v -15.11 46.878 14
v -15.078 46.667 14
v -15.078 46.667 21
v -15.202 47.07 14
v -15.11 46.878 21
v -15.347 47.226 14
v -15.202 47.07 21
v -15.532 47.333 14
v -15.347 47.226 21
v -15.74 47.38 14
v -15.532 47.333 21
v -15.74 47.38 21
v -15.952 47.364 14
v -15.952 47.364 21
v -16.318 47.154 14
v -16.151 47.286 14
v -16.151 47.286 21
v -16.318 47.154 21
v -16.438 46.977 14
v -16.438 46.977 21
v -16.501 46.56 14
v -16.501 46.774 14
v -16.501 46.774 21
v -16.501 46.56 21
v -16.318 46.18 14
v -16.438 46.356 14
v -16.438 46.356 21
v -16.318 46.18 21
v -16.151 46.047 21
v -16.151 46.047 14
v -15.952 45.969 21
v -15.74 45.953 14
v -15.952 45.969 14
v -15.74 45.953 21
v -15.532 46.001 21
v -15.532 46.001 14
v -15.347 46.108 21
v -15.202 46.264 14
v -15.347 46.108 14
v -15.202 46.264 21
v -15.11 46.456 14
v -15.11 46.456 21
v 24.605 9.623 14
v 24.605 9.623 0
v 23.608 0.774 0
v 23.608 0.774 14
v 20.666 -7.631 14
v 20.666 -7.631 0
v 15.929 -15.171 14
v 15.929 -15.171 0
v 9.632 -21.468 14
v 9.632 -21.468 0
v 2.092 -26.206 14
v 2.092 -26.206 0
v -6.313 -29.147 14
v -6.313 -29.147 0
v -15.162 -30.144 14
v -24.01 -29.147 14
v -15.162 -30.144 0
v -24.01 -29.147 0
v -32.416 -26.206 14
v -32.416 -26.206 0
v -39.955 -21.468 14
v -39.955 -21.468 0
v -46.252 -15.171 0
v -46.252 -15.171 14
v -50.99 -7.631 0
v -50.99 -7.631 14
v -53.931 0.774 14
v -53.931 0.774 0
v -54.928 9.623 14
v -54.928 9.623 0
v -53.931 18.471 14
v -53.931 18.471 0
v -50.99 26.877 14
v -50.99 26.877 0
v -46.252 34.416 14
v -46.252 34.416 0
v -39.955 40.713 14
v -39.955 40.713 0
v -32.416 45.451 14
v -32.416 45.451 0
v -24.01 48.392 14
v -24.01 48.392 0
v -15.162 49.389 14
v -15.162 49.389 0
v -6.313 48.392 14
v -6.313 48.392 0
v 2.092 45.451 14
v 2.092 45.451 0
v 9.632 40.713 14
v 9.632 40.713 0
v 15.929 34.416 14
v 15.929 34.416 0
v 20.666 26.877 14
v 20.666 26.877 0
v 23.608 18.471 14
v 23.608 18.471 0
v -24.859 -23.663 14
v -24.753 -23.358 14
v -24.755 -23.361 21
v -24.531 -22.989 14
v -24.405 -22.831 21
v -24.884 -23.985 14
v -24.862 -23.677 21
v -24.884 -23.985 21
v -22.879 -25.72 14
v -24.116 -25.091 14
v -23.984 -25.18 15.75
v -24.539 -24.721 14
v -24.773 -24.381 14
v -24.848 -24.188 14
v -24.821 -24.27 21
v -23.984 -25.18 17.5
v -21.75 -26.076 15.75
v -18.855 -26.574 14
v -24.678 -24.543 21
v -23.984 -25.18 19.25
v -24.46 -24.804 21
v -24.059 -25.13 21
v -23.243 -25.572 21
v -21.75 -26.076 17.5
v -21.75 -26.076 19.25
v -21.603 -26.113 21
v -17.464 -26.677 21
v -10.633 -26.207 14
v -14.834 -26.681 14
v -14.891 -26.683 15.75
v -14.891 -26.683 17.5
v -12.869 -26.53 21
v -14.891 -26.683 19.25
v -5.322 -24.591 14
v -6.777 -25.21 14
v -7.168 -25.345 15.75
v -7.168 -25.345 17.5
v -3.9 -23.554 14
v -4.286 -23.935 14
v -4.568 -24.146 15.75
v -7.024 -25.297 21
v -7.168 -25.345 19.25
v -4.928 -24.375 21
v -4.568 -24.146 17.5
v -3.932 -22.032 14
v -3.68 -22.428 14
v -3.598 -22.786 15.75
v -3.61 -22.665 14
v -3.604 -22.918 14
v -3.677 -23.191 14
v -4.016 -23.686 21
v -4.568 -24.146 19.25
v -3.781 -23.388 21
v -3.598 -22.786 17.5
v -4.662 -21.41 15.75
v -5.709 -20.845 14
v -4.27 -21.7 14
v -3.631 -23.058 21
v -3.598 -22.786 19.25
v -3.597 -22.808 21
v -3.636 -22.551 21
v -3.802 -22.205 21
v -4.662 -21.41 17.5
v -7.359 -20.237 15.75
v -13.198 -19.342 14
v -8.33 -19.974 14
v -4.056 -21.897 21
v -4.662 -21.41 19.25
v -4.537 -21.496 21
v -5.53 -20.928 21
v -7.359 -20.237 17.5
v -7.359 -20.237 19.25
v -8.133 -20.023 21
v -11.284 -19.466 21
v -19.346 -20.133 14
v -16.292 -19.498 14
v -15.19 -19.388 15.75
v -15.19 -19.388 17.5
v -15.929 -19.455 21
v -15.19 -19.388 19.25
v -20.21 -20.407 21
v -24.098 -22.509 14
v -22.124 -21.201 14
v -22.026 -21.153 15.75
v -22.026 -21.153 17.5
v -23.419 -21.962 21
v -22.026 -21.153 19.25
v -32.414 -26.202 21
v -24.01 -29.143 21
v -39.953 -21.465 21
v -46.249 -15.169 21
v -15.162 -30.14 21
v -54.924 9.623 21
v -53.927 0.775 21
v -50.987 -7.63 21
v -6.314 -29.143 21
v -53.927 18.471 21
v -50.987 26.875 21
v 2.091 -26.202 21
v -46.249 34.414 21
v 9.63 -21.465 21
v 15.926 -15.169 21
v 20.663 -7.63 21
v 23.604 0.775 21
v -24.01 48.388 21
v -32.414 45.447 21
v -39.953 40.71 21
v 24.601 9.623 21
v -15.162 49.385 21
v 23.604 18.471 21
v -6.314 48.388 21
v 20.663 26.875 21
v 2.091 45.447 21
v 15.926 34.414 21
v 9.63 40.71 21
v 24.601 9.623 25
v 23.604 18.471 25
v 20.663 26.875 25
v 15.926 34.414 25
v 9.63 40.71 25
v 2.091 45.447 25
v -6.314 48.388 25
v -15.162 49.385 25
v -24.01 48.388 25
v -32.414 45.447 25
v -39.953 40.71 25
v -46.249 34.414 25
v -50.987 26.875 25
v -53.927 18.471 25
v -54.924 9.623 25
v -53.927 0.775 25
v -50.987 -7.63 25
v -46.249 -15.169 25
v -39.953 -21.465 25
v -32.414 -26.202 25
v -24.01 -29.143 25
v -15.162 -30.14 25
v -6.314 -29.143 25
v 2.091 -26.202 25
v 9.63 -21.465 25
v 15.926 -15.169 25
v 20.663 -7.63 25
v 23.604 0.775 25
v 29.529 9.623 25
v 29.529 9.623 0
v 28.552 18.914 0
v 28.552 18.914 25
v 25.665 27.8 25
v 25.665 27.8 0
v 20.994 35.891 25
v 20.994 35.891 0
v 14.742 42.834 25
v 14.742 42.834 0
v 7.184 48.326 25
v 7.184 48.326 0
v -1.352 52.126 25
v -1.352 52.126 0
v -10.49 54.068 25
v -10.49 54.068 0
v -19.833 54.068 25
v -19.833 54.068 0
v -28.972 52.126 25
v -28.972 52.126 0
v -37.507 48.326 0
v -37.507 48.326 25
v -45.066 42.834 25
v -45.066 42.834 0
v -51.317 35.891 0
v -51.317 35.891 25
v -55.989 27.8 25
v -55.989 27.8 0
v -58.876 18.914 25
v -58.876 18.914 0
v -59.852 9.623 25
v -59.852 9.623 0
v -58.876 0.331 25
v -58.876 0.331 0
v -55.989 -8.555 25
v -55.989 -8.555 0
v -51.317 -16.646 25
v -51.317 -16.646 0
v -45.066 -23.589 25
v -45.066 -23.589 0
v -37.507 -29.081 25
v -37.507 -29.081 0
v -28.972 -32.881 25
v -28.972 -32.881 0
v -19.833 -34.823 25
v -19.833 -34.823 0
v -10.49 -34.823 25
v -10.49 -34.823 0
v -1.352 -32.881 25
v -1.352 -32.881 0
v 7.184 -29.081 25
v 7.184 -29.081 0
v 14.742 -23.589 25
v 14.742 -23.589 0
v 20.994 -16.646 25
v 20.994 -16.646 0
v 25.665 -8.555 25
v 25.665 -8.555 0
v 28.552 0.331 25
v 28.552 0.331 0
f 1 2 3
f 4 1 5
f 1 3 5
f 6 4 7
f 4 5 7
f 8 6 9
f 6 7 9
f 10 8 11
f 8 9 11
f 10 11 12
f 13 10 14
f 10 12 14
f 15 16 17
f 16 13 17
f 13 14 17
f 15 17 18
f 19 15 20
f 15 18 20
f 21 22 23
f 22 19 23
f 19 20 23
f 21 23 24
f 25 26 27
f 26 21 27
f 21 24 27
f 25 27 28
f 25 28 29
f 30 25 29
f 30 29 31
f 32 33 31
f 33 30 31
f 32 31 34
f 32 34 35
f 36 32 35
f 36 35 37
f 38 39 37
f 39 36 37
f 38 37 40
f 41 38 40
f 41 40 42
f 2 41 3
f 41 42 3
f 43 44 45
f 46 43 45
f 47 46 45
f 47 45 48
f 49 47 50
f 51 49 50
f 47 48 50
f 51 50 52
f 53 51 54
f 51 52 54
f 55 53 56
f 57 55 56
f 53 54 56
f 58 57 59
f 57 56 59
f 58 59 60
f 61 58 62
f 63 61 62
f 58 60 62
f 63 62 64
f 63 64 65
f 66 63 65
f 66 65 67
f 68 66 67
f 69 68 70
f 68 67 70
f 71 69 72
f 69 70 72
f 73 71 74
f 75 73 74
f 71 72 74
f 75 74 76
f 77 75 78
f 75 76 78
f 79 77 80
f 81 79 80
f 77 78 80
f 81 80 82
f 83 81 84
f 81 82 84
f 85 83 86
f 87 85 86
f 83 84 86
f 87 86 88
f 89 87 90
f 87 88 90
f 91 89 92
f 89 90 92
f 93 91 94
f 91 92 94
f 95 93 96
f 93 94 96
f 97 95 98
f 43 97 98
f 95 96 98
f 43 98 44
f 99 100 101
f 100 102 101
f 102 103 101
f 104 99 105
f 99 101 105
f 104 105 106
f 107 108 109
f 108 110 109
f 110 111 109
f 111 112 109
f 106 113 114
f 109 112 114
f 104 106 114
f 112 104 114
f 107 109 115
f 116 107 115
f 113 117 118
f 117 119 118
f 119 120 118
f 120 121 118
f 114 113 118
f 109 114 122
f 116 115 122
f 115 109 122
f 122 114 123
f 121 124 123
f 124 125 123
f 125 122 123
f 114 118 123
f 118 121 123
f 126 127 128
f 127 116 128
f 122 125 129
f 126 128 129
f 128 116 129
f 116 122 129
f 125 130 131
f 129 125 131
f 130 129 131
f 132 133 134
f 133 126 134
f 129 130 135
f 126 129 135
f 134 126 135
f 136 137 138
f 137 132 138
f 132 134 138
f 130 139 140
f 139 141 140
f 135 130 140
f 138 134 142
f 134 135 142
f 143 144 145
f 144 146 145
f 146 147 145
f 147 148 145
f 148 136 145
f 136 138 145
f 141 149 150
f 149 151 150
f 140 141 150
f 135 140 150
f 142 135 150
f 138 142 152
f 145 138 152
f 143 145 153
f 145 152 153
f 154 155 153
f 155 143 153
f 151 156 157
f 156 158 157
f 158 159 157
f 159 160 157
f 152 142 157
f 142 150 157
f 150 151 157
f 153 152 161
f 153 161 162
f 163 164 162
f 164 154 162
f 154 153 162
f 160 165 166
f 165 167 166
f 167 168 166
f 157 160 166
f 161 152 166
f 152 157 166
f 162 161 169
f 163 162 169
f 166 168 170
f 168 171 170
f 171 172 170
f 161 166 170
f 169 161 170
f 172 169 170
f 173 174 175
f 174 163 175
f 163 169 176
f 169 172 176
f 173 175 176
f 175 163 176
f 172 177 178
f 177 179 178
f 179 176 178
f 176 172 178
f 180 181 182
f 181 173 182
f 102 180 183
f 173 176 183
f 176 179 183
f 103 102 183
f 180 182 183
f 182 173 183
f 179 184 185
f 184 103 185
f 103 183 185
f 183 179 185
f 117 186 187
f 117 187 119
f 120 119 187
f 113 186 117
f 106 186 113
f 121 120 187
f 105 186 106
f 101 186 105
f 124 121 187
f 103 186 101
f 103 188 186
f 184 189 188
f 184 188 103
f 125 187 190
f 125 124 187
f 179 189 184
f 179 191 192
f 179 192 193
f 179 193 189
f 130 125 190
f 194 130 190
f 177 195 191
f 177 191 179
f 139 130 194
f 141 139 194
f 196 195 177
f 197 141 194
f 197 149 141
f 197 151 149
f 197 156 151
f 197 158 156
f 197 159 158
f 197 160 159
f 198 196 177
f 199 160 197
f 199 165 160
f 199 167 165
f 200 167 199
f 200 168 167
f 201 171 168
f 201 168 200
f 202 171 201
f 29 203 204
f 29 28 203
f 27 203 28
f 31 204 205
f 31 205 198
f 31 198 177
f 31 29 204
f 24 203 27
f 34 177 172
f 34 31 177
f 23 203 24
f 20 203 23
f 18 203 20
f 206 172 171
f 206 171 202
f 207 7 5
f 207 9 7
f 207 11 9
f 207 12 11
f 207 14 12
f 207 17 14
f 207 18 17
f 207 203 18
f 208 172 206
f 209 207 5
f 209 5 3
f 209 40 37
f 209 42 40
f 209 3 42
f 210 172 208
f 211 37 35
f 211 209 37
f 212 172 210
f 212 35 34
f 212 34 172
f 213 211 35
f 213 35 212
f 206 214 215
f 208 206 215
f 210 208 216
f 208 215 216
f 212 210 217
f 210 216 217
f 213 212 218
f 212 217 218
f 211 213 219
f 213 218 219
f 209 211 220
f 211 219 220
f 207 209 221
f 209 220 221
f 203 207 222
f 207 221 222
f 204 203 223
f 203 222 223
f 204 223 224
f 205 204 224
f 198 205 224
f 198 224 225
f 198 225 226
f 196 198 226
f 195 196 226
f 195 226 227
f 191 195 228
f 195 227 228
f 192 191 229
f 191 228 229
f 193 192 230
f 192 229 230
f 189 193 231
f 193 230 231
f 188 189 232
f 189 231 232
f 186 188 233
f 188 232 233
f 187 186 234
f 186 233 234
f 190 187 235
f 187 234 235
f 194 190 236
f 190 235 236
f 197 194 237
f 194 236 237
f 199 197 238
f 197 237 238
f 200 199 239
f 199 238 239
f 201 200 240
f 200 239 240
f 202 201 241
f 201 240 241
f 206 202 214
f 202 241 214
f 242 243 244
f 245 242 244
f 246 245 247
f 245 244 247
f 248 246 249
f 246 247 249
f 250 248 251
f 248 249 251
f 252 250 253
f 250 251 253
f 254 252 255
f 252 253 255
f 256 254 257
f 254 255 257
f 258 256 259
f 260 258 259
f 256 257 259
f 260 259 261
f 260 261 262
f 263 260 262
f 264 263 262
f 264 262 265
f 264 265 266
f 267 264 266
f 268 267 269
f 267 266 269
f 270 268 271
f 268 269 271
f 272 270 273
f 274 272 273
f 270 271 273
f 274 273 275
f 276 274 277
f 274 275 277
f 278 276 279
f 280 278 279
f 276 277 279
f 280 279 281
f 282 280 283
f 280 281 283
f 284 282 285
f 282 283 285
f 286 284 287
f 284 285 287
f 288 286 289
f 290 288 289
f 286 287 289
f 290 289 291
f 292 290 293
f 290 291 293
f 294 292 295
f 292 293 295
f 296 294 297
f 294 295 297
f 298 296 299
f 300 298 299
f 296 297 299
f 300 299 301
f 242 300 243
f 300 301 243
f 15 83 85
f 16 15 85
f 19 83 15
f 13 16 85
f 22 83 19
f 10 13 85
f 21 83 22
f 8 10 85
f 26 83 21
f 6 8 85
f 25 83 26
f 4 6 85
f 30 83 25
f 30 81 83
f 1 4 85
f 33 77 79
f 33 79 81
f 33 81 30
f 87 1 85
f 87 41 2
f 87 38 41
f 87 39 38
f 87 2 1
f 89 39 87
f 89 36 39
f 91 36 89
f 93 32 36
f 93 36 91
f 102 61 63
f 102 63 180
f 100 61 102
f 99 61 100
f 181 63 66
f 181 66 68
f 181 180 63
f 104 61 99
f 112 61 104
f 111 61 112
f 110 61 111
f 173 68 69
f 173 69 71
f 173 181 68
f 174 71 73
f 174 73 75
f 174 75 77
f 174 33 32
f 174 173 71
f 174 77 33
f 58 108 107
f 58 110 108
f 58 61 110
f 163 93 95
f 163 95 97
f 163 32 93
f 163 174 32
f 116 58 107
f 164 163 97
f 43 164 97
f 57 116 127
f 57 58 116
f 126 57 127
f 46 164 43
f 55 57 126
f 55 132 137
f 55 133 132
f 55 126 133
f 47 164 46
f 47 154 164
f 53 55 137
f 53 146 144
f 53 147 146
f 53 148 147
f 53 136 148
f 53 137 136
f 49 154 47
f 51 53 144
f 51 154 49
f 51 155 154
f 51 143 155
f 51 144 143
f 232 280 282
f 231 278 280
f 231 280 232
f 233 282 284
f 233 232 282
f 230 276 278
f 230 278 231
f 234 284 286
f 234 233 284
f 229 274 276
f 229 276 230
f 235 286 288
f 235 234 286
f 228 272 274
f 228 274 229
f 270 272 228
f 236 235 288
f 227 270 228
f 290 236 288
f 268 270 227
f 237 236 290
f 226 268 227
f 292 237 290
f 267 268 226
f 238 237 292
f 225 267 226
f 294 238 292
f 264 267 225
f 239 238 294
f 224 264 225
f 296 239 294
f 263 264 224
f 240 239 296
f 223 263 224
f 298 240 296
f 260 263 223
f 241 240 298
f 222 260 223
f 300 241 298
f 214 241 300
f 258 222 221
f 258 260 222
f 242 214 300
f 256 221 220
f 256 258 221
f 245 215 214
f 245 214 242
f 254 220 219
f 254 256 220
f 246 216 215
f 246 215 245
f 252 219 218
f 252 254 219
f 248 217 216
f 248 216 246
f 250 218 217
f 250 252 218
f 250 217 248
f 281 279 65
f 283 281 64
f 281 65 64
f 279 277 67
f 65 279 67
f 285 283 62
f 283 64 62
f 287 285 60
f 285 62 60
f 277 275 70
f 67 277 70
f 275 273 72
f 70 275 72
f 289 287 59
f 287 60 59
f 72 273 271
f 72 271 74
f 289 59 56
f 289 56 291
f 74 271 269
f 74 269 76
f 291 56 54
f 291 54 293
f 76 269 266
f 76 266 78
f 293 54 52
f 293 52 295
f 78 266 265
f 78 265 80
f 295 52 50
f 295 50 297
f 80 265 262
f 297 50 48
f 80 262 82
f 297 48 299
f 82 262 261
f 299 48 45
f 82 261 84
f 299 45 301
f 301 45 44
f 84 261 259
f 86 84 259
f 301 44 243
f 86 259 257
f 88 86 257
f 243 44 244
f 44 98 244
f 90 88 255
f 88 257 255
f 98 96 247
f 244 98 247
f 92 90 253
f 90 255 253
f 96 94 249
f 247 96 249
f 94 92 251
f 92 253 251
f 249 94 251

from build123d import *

# Parameters (mm, degrees)
F0_R     = 44.6905983142
F1_DEPTH = 25
F2_R     = 39.7625811832
F3_DEPTH = 4
F5_DEPTH = 21.001
F6_R     = 0.7154375695
F7_DEPTH = 21.0010001
F8_R     = 39.7662150712
F8_R_2   = 0.7154375695
F9_DEPTH = 14


with BuildPart() as f1:
    # F0 (on Top) → F1 (new body)
    with BuildSketch(Plane.XY):
        with Locations((-15.1616595685, 9.6226148307)):
            Circle(F0_R)
    extrude(amount=F1_DEPTH)

    # F2 (on face) → F3 (cut)
    with BuildSketch(Plane.XY.offset(25)):
        with Locations((-15.1616595685, 9.6226148307)):
            Circle(F2_R)
    extrude(amount=-F3_DEPTH, mode=Mode.SUBTRACT)

    # F4 (on face) → F5 (cut, through all)
    with BuildSketch(Plane.XY.offset(21)):
        with BuildLine():
            add(Edge.make_bspline(
                [(-24.8842015862, -23.9847730845), (-24.751571743, -25.7479147281), (-14.8764070104, -28.1339639947), (2.363229172, -22.8278430113), (-15.4108273297, -17.1809770311), (-25.0192258083, -22.1898012822), (-24.8842015862, -23.9847730845)],
                knots=[0, 0, 0, 0, 0.2396576866, 0.4971175886, 0.7560157511, 1, 1, 1, 1], degree=3))
        make_face()
    extrude(amount=-F5_DEPTH, mode=Mode.SUBTRACT)

    # F6 (on face) → F7 (cut, through all)
    with BuildSketch(Plane.XY.offset(21)):
        with Locations((-15.7932732254, 46.6668978333)):
            Circle(F6_R)
    extrude(amount=-F7_DEPTH, mode=Mode.SUBTRACT)

    # F8 (on face) → F9 (cut)
    with BuildSketch(Plane(origin=(0, 0, 0), x_dir=(1, 0, 0), z_dir=(0, 0, -1))):
        with Locations((-15.1616595685, -9.6226148307)):
            Circle(F8_R)
        with Locations((-15.7932732254, -46.6668978333)):
            Circle(F8_R_2, mode=Mode.SUBTRACT)
        with BuildLine():
            add(Edge.make_bspline(
                [(-24.8842015862, 23.9847730845), (-24.8911452084, 23.8924666388), (-24.888371728, 23.799570827), (-24.8762555423, 23.7072804576), (-24.855790455, 23.6164271336), (-24.8281284381, 23.5275727498), (-24.7943692309, 23.4410534624), (-24.7554721282, 23.3569978115), (-24.6762660636, 23.2076683313), (-24.6373321353, 23.141629018), (-24.5957616183, 23.0771739055), (-24.5518941434, 23.0142517205), (-24.5060146802, 22.9528055987), (-24.4583585563, 22.8927697396), (-24.4091136917, 22.8340678621), (-24.2951335725, 22.7048867825), (-24.2296199391, 22.6351387447), (-24.1621765597, 22.5672221501), (-24.0930442899, 22.5010185723), (-24.0224196237, 22.4364260325), (-23.9504628247, 22.3733507123), (-23.8773019966, 22.3117027052), (-23.6280353269, 22.1092963253), (-23.4470131486, 21.9747437686), (-23.2612685118, 21.8466153281), (-23.0716712534, 21.7242481532), (-22.87886828, 21.6071333648), (-22.6833359387, 21.4948360767), (-22.4853761009, 21.3869997408), (-22.0365992692, 21.1545493655), (-21.7847229546, 21.0322559578), (-21.5300131244, 20.9158571469), (-21.2728395726, 20.8049762518), (-21.0134959265, 20.6993265457), (-20.7522141353, 20.5986781439), (-20.4891682368, 20.502849378), (-19.8972368304, 20.2989876643), (-19.5675375394, 20.1934415753), (-19.2356580968, 20.0947838468), (-18.9018320844, 20.0028445839), (-18.5662614795, 19.9175220072), (-18.2291224443, 19.838762292), (-17.8905679312, 19.7665502585), (-17.2582009761, 19.6444102678), (-16.964736384, 19.5927818802), (-16.6704234935, 19.5460424355), (-16.3753531794, 19.5042292364), (-16.0796172889, 19.4673986596), (-15.7833089045, 19.4356246154), (-15.4865226065, 19.4089970085), (-14.6964867848, 19.3521656766), (-14.2026325717, 19.3311579491), (-13.7082719853, 19.323673936), (-13.2138389543, 19.3290136415), (-12.7197212313, 19.3466491477), (-12.2262608224, 19.3762031344), (-11.7337550637, 19.4174569261), (-10.813518073, 19.5166010712), (-10.3855908509, 19.5717051597), (-9.9588285875, 19.6356829877), (-9.5334400248, 19.7086182547), (-9.109697804, 19.7907216797), (-8.6879395492, 19.8823360076), (-8.2685809043, 19.9840006907), (-7.6692511074, 20.1461394501), (-7.4869229926, 20.197739325), (-7.305219405, 20.2515355676), (-7.1241991626, 20.3076214003), (-6.9439349033, 20.3661052757), (-6.7645147562, 20.4271160266), (-6.5860453938, 20.4908121068), (-6.254696052, 20.6151838585), (-6.1015679798, 20.6751409609), (-5.9493429971, 20.7374007127), (-5.7981254711, 20.8021210424), (-5.6480527105, 20.8694825334), (-5.4993000619, 20.9396997859), (-5.352091776, 21.0130449311), (-5.049328083, 21.1730724882), (-4.8944301935, 21.2601773381), (-4.7420379458, 21.351804078), (-4.5925696804, 21.4486212058), (-4.4467809482, 21.5512951436), (-4.3059967032, 21.6607552403), (-4.171918878, 21.7779694123), (-3.9820103602, 21.9721649834), (-3.91933381, 22.0417830638), (-3.859860511, 22.1143746793), (-3.8042449113, 22.190231403), (-3.7534261664, 22.2695356098), (-3.7086220132, 22.352355558), (-3.6712765509, 22.4386130462), (-3.6325609686, 22.5604796694), (-3.6235475081, 22.592989586), (-3.6158562116, 22.625508139), (-3.6094987647, 22.6580310997), (-3.6044868395, 22.690554248), (-3.6008320948, 22.7230733726), (-3.5985461757, 22.7555842705), (-3.5967352526, 22.8205812138), (-3.5972089492, 22.8530673208), (-3.5990503765, 22.8855383141), (-3.6022481072, 22.9179914392), (-3.6067907142, 22.9504239415), (-3.6126667703, 22.9828330664), (-3.619864848, 23.0152160594), (-3.6428351371, 23.102560259), (-3.6608525682, 23.1565906194), (-3.6821125308, 23.2094824212), (-3.7062697452, 23.2611273323), (-3.7329838201, 23.3114710781), (-3.7619452523, 23.3605016698), (-3.7928905413, 23.408242296), (-3.8646571625, 23.5102606567), (-3.9062117551, 23.5639870404), (-3.949907681, 23.6160285277), (-3.995440574, 23.6664779113), (-4.0425578215, 23.7154257906), (-4.0910543201, 23.7629642703), (-4.140770382, 23.8091888469), (-4.2558032479, 23.9110669108), (-4.3217455541, 23.9659664387), (-4.3891611489, 24.0190785563), (-4.4578435397, 24.070548321), (-4.5276265311, 24.120498277), (-4.5983770003, 24.1690378707), (-4.6699912206, 24.2162683608), (-4.8598647658, 24.3369393694), (-4.979368245, 24.4083687716), (-5.1005551521, 24.4769559223), (-5.2231590563, 24.5429853098), (-5.3469747233, 24.606681357), (-5.4718435874, 24.6682345898), (-5.5976470884, 24.7278140349), (-5.8731020203, 24.8534095069), (-6.0230481389, 24.9187177349), (-6.1739919373, 24.9817193826), (-6.3258095179, 25.0425942529), (-6.4784007471, 25.1014892666), (-6.6316847131, 25.1585296043), (-6.7855972746, 25.2138248228), (-7.2450409477, 25.3733585476), (-7.5522097036, 25.4728034138), (-7.8612095316, 25.5665353033), (-8.1717534402, 25.6550457013), (-8.4836197787, 25.7387057177), (-8.7966397248, 25.8178093289), (-9.1106941619, 25.8925843063), (-9.7751521214, 26.0415643167), (-10.1257377207, 26.1148049283), (-10.4773290394, 26.1831793836), (-10.8298122723, 26.2468536908), (-11.1830903824, 26.3059373134), (-11.5370805939, 26.3604964973), (-11.8917133021, 26.410560103), (-12.4141126322, 26.4775592691), (-12.5814208468, 26.4980023592), (-12.7488502783, 26.517446117), (-12.916394228, 26.535887619), (-13.0840460673, 26.5533221125), (-13.2517992377, 26.569743015), (-13.4196472511, 26.5851419147), (-13.755440419, 26.6138684058), (-13.9233852036, 26.6271967172), (-14.0914117258, 26.6394844457), (-14.2595133059, 26.6507169279), (-14.4276829989, 26.6608821201), (-14.5959136343, 26.6699648285), (-14.7641978026, 26.6779426226), (-15.4668094045, 26.7065616899), (-16.0014815913, 26.717052595), (-16.5363439033, 26.7163761275), (-17.0711513874, 26.7044794526), (-17.6056107666, 26.6811276526), (-18.1393801372, 26.6459021949), (-18.6720648144, 26.5981210663), (-19.4381711152, 26.509353217), (-19.6728205121, 26.4794361441), (-19.9071102034, 26.4467241944), (-20.1409861033, 26.4110930398), (-20.374379842, 26.3723961579), (-20.607207594, 26.3304577799), (-20.8393678801, 26.2850600584), (-21.2714530924, 26.1932991389), (-21.4715479801, 26.1478661938), (-21.6709615908, 26.0994400371), (-21.8695961986, 26.0478050892), (-22.067313537, 25.9927020038), (-22.2639323316, 25.9338188721), (-22.4592205165, 25.8707637255), (-22.8526079279, 25.7330984996), (-23.0501942229, 25.658329585), (-23.2457129866, 25.5779976939), (-23.4388079377, 25.4912718478), (-23.6287503173, 25.3972628999), (-23.8142215655, 25.2946773515), (-23.993488719, 25.1821020816), (-24.2354137555, 25.0033783334), (-24.305527566, 24.9480349583), (-24.3736940108, 24.890201273), (-24.4395833556, 24.8296527893), (-24.5027360604, 24.7661764981), (-24.5625646396, 24.6995727976), (-24.6183569307, 24.6296586324), (-24.7132853809, 24.4928564182), (-24.7536853284, 24.4268044353), (-24.7898357294, 24.358145571), (-24.8210372692, 24.2870046025), (-24.8465837183, 24.2136183714), (-24.8658479214, 24.138366296), (-24.8784062595, 24.0618144324), (-24.8842015862, 23.9847730845)],
                knots=[0, 0, 0, 0, 0, 0, 0, 0, 0, 0.0154781502, 0.0154781502, 0.0154781502, 0.0154781502, 0.0154781502, 0.0154781502, 0.0154781502, 0.0283061693, 0.0283061693, 0.0283061693, 0.0283061693, 0.0283061693, 0.0283061693, 0.0283061693, 0.0443208042, 0.0443208042, 0.0443208042, 0.0443208042, 0.0443208042, 0.0443208042, 0.0443208042, 0.0820556467, 0.0820556467, 0.0820556467, 0.0820556467, 0.0820556467, 0.0820556467, 0.0820556467, 0.1289005454, 0.1289005454, 0.1289005454, 0.1289005454, 0.1289005454, 0.1289005454, 0.1289005454, 0.1868172217, 0.1868172217, 0.1868172217, 0.1868172217, 0.1868172217, 0.1868172217, 0.1868172217, 0.2366703877, 0.2366703877, 0.2366703877, 0.2366703877, 0.2366703877, 0.2366703877, 0.2366703877, 0.3193543861, 0.3193543861, 0.3193543861, 0.3193543861, 0.3193543861, 0.3193543861, 0.3193543861, 0.3915439512, 0.3915439512, 0.3915439512, 0.3915439512, 0.3915439512, 0.3915439512, 0.3915439512, 0.4232521415, 0.4232521415, 0.4232521415, 0.4232521415, 0.4232521415, 0.4232521415, 0.4232521415, 0.4507724944, 0.4507724944, 0.4507724944, 0.4507724944, 0.4507724944, 0.4507724944, 0.4507724944, 0.4805674531, 0.4805674531, 0.4805674531, 0.4805674531, 0.4805674531, 0.4805674531, 0.4805674531, 0.496271474, 0.496271474, 0.496271474, 0.496271474, 0.496271474, 0.496271474, 0.496271474, 0.5019818537, 0.5019818537, 0.5019818537, 0.5019818537, 0.5019818537, 0.5019818537, 0.5019818537, 0.5076922315, 0.5076922315, 0.5076922315, 0.5076922315, 0.5076922315, 0.5076922315, 0.5076922315, 0.5173977756, 0.5173977756, 0.5173977756, 0.5173977756, 0.5173977756, 0.5173977756, 0.5173977756, 0.5289826305, 0.5289826305, 0.5289826305, 0.5289826305, 0.5289826305, 0.5289826305, 0.5289826305, 0.5436197749, 0.5436197749, 0.5436197749, 0.5436197749, 0.5436197749, 0.5436197749, 0.5436197749, 0.5673675977, 0.5673675977, 0.5673675977, 0.5673675977, 0.5673675977, 0.5673675977, 0.5673675977, 0.5952652382, 0.5952652382, 0.5952652382, 0.5952652382, 0.5952652382, 0.5952652382, 0.5952652382, 0.6503316105, 0.6503316105, 0.6503316105, 0.6503316105, 0.6503316105, 0.6503316105, 0.6503316105, 0.7114170742, 0.7114170742, 0.7114170742, 0.7114170742, 0.7114170742, 0.7114170742, 0.7114170742, 0.7401663215, 0.7401663215, 0.7401663215, 0.7401663215, 0.7401663215, 0.7401663215, 0.7401663215, 0.7689019232, 0.7689019232, 0.7689019232, 0.7689019232, 0.7689019232, 0.7689019232, 0.7689019232, 0.8601091042, 0.8601091042, 0.8601091042, 0.8601091042, 0.8601091042, 0.8601091042, 0.8601091042, 0.9004581455, 0.9004581455, 0.9004581455, 0.9004581455, 0.9004581455, 0.9004581455, 0.9004581455, 0.9354610916, 0.9354610916, 0.9354610916, 0.9354610916, 0.9354610916, 0.9354610916, 0.9354610916, 0.9715626919, 0.9715626919, 0.9715626919, 0.9715626919, 0.9715626919, 0.9715626919, 0.9715626919, 0.9868177281, 0.9868177281, 0.9868177281, 0.9868177281, 0.9868177281, 0.9868177281, 0.9868177281, 1, 1, 1, 1, 1, 1, 1, 1, 1], degree=8))
        make_face(mode=Mode.SUBTRACT)
    extrude(amount=-F9_DEPTH, mode=Mode.SUBTRACT)


solid = f1.part
